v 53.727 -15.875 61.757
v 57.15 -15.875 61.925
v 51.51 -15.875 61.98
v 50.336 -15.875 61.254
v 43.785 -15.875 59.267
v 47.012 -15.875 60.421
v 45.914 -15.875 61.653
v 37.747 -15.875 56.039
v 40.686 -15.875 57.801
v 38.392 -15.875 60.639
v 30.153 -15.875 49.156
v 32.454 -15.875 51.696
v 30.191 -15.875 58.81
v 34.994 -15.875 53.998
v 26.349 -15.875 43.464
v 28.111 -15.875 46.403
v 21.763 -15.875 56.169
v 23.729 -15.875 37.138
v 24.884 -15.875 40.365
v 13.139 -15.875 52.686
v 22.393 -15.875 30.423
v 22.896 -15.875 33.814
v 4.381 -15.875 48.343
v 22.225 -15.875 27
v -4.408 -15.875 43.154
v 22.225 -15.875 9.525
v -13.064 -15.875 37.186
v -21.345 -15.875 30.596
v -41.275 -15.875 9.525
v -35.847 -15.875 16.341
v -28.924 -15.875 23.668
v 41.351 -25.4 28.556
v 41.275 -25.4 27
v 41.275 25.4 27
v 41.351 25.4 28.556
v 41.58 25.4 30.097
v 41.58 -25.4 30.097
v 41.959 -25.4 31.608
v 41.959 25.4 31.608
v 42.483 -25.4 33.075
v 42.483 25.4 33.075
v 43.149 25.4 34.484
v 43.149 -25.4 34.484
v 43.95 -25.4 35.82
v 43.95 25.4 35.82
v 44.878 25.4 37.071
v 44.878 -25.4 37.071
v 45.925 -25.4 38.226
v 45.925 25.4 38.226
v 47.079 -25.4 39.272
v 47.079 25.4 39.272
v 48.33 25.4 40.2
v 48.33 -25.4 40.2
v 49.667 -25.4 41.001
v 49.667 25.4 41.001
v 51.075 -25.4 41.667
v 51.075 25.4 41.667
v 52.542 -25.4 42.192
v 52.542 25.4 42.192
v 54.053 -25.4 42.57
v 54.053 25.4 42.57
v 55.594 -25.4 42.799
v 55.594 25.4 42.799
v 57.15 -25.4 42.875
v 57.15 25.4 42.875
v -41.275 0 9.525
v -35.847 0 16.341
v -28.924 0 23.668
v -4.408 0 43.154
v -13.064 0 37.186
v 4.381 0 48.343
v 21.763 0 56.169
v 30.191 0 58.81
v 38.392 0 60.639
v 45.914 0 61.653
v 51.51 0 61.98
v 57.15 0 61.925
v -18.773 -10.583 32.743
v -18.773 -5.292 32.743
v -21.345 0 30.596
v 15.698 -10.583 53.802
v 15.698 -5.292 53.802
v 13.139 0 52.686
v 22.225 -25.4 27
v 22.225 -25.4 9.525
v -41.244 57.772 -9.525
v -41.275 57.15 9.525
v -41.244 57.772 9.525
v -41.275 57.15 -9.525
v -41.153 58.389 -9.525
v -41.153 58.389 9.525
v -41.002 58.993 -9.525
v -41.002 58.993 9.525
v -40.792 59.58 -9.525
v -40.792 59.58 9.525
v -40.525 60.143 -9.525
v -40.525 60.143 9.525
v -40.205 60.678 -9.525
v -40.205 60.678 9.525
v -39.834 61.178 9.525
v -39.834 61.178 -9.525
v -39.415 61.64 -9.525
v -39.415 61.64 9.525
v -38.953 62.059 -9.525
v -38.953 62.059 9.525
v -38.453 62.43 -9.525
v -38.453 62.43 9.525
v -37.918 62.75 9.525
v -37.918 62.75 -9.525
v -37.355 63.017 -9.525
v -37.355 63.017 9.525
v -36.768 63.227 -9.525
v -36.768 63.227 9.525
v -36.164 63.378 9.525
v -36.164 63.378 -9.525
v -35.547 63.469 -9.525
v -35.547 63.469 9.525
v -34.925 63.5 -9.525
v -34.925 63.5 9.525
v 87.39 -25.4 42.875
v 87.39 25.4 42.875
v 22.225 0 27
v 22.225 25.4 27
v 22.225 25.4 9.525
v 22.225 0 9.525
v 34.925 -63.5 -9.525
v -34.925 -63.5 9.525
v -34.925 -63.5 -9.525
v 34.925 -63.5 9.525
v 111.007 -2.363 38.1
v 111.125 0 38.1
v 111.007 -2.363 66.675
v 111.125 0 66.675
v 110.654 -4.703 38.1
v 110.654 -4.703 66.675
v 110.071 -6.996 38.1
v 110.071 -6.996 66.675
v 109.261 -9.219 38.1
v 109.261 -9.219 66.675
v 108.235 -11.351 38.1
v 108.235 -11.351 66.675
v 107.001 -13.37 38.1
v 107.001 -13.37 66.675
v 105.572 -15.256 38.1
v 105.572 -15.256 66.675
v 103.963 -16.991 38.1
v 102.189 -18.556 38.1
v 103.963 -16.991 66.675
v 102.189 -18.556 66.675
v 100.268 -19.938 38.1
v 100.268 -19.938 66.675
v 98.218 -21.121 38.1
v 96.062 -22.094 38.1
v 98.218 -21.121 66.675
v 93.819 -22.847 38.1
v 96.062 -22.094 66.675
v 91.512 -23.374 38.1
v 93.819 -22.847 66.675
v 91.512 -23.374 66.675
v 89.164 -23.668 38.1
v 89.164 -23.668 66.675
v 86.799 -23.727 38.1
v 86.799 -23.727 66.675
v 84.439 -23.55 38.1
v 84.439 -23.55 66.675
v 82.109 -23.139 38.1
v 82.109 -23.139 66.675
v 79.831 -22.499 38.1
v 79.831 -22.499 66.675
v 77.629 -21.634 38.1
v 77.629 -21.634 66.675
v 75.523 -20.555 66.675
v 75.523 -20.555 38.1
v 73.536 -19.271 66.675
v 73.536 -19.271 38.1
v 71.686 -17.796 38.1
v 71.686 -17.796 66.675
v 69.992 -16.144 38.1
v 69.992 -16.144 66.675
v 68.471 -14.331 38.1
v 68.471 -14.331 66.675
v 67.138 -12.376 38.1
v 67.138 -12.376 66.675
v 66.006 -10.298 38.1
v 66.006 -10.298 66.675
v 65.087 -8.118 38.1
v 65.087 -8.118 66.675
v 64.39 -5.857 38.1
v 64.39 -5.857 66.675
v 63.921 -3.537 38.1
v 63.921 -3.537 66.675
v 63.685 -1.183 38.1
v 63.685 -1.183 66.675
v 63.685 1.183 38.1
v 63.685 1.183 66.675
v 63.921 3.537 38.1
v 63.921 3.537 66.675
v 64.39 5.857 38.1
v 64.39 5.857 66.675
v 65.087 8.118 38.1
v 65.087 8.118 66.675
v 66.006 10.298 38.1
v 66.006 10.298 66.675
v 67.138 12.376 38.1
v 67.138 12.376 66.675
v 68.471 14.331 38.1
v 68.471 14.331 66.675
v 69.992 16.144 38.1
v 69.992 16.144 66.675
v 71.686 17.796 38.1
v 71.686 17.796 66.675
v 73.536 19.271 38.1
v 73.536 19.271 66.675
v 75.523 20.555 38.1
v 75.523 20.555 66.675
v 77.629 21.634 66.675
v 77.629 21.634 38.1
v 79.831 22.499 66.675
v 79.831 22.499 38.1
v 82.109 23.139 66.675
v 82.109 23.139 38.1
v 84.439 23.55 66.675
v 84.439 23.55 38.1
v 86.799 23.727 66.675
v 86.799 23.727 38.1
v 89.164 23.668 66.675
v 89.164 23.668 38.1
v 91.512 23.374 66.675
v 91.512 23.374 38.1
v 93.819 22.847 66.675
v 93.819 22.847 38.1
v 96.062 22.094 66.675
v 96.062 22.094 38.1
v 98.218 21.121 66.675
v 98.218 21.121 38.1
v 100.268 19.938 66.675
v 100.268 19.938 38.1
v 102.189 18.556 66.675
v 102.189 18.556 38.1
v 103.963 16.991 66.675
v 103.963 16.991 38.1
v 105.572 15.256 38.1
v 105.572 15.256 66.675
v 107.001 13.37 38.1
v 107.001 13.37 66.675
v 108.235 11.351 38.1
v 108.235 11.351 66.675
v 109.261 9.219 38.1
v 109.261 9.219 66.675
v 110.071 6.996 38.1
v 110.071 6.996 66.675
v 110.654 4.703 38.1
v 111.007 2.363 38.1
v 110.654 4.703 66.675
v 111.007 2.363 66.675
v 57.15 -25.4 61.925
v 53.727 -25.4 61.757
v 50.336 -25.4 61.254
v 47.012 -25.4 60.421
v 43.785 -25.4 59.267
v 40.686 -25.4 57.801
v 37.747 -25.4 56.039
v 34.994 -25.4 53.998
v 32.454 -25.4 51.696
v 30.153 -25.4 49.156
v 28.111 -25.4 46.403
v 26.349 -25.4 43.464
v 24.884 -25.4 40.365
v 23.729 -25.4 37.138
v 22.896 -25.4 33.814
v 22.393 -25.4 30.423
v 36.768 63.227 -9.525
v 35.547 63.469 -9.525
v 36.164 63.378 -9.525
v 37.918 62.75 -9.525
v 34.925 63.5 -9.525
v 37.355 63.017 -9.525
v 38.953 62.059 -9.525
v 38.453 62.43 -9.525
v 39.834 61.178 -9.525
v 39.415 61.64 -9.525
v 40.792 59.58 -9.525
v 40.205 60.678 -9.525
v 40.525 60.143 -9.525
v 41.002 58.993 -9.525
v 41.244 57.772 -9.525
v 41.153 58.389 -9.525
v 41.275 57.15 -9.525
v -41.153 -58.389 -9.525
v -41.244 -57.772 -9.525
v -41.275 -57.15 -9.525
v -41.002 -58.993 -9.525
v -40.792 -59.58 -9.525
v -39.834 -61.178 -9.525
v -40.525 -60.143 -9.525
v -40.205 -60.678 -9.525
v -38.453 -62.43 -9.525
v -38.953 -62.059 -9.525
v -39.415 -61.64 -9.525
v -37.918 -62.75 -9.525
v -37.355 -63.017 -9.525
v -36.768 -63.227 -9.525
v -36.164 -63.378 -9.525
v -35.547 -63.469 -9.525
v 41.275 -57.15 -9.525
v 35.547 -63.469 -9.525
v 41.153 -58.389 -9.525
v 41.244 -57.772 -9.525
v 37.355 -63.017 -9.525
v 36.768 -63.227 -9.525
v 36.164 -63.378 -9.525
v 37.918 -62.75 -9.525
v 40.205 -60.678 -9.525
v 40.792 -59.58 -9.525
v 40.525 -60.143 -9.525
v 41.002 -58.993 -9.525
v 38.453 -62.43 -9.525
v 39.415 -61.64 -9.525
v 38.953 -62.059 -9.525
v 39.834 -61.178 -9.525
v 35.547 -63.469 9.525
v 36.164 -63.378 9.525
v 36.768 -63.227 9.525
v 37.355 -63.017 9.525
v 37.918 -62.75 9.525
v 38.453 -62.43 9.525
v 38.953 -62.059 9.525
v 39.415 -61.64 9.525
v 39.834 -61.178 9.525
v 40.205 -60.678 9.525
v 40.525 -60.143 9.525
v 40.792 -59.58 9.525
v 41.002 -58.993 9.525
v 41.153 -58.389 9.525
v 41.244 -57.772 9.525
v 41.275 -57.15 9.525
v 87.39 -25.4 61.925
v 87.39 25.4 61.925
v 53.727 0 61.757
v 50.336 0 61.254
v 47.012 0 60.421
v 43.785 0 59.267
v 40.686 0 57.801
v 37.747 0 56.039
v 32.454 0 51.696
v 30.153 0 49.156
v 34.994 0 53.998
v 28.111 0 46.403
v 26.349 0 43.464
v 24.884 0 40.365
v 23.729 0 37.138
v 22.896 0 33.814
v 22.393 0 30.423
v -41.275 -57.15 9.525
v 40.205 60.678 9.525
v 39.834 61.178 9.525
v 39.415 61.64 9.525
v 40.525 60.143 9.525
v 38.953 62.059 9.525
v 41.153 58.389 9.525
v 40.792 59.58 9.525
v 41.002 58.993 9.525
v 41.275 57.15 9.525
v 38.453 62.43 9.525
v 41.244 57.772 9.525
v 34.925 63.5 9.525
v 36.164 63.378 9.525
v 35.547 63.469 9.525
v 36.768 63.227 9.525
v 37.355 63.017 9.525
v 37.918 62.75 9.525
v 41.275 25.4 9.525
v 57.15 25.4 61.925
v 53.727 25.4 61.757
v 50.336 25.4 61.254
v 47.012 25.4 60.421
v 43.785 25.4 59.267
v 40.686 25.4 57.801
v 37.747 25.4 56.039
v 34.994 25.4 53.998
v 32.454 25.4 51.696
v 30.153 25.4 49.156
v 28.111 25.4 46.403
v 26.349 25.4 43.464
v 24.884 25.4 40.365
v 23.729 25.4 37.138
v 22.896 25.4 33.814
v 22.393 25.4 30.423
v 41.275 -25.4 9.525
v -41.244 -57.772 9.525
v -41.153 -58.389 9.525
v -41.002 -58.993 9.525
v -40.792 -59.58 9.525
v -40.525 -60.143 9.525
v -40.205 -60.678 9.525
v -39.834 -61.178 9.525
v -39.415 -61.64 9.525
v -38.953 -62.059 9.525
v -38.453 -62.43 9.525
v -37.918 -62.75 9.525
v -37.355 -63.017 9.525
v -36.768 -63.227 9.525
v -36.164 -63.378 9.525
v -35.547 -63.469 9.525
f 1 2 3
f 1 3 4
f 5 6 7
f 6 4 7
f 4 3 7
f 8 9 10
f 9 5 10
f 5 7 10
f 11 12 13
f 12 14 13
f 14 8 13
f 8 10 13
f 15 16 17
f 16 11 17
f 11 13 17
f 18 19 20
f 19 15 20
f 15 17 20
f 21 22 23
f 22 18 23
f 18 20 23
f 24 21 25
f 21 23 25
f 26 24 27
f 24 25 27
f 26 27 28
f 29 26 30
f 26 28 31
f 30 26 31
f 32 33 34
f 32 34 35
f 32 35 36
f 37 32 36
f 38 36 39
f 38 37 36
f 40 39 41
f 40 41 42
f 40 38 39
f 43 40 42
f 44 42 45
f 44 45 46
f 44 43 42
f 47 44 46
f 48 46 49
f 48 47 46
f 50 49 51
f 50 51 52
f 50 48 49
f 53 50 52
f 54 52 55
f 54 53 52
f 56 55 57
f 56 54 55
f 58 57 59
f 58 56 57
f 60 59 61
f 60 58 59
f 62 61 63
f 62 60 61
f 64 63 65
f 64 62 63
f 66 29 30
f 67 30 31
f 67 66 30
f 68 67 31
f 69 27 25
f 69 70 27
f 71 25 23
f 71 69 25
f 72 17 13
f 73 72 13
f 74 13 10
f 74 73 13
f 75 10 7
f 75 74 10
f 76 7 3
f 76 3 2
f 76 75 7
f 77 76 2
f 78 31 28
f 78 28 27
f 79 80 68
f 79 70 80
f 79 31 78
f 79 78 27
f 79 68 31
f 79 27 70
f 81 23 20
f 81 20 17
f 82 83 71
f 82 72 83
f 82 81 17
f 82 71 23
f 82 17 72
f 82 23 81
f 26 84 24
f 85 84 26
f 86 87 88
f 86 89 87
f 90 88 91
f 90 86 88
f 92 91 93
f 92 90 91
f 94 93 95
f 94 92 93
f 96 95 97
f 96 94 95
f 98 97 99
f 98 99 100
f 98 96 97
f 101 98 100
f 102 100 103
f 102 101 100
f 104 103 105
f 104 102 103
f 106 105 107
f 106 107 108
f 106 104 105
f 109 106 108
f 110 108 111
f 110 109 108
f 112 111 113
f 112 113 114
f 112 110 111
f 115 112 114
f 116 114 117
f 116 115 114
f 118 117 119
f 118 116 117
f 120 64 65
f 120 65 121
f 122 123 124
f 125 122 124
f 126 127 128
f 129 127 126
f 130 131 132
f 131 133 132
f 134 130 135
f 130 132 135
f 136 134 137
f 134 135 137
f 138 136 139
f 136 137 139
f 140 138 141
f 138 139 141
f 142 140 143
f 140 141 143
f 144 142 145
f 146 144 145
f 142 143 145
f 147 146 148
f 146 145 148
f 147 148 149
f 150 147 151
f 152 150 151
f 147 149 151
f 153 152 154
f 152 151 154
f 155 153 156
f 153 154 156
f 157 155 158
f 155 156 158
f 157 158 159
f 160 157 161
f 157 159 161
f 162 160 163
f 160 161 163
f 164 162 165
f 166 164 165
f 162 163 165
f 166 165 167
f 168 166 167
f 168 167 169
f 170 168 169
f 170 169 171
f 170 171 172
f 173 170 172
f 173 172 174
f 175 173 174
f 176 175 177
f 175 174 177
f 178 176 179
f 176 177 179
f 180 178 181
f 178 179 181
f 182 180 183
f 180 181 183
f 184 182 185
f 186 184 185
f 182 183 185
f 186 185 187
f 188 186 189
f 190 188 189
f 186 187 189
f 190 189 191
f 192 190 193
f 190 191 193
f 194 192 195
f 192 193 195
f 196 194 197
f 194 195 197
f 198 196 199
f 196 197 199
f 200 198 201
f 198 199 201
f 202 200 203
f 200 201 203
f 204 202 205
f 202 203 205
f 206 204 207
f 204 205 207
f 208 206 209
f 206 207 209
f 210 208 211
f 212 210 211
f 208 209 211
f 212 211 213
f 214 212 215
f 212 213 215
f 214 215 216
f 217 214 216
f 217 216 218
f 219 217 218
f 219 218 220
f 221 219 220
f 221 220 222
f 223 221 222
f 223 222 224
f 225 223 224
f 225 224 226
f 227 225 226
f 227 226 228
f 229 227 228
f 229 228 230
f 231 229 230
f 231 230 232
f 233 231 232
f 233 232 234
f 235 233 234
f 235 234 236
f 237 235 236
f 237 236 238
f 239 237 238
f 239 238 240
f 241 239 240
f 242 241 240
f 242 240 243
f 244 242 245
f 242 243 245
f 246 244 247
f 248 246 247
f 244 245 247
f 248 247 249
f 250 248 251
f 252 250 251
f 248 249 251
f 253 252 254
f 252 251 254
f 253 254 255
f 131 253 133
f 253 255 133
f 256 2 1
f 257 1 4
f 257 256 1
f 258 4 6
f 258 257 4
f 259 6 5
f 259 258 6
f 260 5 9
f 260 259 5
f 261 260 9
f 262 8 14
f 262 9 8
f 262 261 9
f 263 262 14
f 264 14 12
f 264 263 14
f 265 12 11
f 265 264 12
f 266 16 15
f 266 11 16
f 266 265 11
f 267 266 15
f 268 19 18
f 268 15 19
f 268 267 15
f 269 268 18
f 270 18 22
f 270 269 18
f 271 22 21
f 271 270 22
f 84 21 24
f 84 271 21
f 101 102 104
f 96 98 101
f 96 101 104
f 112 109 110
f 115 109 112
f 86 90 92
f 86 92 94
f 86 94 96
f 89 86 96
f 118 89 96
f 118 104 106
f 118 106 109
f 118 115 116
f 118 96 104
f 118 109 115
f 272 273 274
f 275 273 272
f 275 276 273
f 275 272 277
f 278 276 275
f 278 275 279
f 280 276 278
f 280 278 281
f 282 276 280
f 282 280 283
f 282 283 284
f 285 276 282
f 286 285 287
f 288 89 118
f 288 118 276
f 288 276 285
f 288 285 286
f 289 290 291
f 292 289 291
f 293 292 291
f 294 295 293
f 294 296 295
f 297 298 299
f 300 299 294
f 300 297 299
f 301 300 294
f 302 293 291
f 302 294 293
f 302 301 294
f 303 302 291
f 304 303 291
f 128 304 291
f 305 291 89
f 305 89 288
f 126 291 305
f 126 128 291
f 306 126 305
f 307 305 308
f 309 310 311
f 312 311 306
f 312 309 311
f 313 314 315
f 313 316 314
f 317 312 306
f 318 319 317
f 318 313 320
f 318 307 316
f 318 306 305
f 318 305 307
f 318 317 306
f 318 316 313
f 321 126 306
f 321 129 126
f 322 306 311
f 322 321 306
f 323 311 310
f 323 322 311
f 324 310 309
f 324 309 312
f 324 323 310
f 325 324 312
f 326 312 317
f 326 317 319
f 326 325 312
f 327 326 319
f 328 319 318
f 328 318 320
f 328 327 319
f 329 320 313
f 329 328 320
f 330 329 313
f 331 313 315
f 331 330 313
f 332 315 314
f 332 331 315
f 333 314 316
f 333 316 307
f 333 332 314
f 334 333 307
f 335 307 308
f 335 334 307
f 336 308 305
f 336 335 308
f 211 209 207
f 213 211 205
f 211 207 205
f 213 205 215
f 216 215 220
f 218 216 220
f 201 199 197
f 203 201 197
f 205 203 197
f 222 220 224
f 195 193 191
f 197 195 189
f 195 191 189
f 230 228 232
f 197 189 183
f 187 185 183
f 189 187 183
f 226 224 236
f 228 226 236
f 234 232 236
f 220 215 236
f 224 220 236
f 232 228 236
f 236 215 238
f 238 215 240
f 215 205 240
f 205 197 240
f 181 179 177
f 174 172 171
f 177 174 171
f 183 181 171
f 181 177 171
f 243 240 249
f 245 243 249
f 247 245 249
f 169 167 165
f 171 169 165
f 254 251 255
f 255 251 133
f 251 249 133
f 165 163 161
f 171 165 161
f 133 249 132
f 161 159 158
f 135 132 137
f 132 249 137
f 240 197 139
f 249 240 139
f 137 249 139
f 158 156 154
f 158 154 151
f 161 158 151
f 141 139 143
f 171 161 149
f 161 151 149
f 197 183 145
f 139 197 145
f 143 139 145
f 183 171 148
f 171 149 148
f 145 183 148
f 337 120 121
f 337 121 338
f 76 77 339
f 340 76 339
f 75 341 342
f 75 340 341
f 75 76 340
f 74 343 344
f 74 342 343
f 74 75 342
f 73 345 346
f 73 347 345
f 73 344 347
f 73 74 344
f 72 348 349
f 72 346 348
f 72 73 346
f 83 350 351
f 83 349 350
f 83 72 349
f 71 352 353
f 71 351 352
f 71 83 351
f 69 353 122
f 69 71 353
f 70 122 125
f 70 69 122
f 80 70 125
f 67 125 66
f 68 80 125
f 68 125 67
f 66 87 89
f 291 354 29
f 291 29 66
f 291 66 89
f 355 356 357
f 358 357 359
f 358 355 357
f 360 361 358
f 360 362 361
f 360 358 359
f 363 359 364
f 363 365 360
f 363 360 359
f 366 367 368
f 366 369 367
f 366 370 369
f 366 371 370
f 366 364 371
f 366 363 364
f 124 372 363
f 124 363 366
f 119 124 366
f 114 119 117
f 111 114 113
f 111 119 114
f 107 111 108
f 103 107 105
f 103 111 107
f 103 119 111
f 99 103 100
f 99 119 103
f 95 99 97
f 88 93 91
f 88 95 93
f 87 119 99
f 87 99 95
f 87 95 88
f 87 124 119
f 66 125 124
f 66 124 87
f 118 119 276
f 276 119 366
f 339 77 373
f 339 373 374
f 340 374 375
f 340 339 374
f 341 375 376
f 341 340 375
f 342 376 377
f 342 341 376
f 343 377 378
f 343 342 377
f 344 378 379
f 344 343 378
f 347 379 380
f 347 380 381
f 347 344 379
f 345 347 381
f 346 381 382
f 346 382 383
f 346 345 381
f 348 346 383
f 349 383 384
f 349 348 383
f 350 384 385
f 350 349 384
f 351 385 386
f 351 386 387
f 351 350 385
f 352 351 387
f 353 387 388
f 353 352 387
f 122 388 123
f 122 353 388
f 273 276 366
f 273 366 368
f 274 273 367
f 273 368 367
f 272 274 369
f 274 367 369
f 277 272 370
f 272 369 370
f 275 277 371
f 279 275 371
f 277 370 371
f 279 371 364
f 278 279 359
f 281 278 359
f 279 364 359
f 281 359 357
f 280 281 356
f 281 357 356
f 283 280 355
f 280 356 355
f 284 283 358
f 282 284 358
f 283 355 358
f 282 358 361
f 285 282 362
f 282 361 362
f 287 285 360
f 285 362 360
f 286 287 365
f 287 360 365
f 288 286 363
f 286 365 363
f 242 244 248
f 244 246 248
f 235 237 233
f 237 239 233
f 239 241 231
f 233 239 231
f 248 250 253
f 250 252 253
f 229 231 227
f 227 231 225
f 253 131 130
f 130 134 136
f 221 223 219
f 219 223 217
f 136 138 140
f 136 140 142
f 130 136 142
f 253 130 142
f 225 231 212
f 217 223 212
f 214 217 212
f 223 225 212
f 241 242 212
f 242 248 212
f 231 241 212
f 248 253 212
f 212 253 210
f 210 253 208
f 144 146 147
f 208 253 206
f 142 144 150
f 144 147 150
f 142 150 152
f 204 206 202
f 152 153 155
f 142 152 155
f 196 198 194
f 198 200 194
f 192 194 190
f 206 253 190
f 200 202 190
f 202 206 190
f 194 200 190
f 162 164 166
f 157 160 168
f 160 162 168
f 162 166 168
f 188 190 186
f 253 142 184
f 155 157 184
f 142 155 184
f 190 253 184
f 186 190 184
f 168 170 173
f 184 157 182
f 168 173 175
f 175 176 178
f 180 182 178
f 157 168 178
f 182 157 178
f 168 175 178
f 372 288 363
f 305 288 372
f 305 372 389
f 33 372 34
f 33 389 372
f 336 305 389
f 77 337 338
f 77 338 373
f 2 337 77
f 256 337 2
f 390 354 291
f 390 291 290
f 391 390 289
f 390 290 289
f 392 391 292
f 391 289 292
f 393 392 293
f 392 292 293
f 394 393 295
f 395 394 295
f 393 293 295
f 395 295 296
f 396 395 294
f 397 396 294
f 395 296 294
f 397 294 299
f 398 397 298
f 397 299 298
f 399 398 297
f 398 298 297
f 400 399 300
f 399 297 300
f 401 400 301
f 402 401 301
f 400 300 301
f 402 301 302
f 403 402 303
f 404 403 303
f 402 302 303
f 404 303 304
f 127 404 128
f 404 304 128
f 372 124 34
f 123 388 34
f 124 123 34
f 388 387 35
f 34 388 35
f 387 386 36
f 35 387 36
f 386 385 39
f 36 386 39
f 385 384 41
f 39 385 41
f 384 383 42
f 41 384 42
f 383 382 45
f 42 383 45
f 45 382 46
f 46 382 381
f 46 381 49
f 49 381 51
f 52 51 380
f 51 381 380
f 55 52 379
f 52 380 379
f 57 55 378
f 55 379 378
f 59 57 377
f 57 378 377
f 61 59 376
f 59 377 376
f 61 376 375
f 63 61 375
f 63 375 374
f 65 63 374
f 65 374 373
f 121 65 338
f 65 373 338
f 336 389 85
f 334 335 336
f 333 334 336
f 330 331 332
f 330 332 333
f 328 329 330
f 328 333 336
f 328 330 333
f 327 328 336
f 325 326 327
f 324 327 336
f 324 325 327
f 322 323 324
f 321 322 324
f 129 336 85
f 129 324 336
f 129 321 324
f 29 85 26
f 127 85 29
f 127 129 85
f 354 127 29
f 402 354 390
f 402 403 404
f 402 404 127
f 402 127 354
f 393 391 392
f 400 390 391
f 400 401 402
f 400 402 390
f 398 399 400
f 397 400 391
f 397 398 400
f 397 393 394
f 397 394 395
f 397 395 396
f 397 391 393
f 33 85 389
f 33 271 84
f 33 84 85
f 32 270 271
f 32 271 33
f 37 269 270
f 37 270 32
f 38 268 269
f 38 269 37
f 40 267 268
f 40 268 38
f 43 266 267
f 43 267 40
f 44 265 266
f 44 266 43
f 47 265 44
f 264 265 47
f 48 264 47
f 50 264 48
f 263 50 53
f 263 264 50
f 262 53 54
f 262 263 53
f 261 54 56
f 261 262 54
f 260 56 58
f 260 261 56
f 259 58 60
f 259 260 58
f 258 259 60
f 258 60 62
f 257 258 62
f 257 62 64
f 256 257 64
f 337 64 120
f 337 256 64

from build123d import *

# Parameters (mm, degrees)
F1_DEPTH = 63.5
F0_W     = 27.0654788882
F0_H     = 19.05
F2_DEPTH = 25.4
F3_DEPTH = 15.875
F5_R     = 6.35


with BuildPart() as f1:
    # F0 (on Front) → F1 (new body, symmetric)
    with BuildSketch(Plane.XZ):
        Polygon((-41.275, 9.525), (-41.275, -9.525), (41.275, -9.525), (41.275, 9.525), (22.225, 9.525), align=None)
    extrude(amount=F1_DEPTH, both=True)

    # F0 (on Front) → F2 (join, symmetric)
    with BuildSketch(Plane.XZ):
        with BuildLine():
            Line((22.225, 9.525), (41.275, 9.525))
            Line((41.275, 9.525), (41.275, 27.0002))
            ThreePointArc((41.275, 27.0002), (45.9246798487, 38.2255201513), (57.15, 42.8752))
            Line((57.15, 42.8752), (60.325, 42.8752))
            Line((60.325, 42.8752), (60.325, 61.9252))
            Line((60.325, 61.9252), (57.15, 61.9252))
            ThreePointArc((57.15, 61.9252), (32.4542956671, 51.6959043329), (22.225, 27.0002))
            Line((22.225, 27.0002), (22.225, 9.525))
        make_face()
        with Locations((73.8577394441, 52.4002)):
            Rectangle(F0_W, F0_H)
    extrude(amount=F2_DEPTH, both=True)

    # F0 (on Front) → F3 (join)
    with BuildSketch(Plane.XZ):
        with BuildLine():
            add(Edge.make_bspline(
                [(-41.275, 9.525), (-26.4197979122, 30.2293878049), (13.8705614954, 63.8618990779), (57.15, 61.9252)],
                knots=[0, 0, 0, 0, 111.5045361635, 111.5045361635, 111.5045361635, 111.5045361635], degree=3))
            Line((-41.275, 9.525), (22.225, 9.525))
            Line((22.225, 9.525), (22.225, 27.0002))
            ThreePointArc((22.225, 27.0002), (32.4542956671, 51.6959043329), (57.15, 61.9252))
        make_face()
    extrude(amount=F3_DEPTH)

    # F5
    f5_edges = [f1.edges().sort_by_distance(p)[0] for p in [
        (-41.275, -63.5, 0),
        (41.275, 63.5, 0),
        (41.275, -63.5, 0),
        (-41.275, 63.5, 0),
    ]]
    fillet(f5_edges, radius=F5_R)


with BuildPart() as f4:
    # F0 (on Front) → F4 (revolve)
    with BuildSketch(Plane.XZ):
        Polygon((87.3904788882, 66.675), (87.3904788882, 61.9252), (87.3904788882, 42.8752), (87.3904788882, 38.1), (111.125, 38.1), (111.125, 66.675), align=None)
    revolve(axis=Axis((87.3904788882, 0, 52.3875), (0, 0, -1)))


solid = Compound([f1.part, f4.part])
